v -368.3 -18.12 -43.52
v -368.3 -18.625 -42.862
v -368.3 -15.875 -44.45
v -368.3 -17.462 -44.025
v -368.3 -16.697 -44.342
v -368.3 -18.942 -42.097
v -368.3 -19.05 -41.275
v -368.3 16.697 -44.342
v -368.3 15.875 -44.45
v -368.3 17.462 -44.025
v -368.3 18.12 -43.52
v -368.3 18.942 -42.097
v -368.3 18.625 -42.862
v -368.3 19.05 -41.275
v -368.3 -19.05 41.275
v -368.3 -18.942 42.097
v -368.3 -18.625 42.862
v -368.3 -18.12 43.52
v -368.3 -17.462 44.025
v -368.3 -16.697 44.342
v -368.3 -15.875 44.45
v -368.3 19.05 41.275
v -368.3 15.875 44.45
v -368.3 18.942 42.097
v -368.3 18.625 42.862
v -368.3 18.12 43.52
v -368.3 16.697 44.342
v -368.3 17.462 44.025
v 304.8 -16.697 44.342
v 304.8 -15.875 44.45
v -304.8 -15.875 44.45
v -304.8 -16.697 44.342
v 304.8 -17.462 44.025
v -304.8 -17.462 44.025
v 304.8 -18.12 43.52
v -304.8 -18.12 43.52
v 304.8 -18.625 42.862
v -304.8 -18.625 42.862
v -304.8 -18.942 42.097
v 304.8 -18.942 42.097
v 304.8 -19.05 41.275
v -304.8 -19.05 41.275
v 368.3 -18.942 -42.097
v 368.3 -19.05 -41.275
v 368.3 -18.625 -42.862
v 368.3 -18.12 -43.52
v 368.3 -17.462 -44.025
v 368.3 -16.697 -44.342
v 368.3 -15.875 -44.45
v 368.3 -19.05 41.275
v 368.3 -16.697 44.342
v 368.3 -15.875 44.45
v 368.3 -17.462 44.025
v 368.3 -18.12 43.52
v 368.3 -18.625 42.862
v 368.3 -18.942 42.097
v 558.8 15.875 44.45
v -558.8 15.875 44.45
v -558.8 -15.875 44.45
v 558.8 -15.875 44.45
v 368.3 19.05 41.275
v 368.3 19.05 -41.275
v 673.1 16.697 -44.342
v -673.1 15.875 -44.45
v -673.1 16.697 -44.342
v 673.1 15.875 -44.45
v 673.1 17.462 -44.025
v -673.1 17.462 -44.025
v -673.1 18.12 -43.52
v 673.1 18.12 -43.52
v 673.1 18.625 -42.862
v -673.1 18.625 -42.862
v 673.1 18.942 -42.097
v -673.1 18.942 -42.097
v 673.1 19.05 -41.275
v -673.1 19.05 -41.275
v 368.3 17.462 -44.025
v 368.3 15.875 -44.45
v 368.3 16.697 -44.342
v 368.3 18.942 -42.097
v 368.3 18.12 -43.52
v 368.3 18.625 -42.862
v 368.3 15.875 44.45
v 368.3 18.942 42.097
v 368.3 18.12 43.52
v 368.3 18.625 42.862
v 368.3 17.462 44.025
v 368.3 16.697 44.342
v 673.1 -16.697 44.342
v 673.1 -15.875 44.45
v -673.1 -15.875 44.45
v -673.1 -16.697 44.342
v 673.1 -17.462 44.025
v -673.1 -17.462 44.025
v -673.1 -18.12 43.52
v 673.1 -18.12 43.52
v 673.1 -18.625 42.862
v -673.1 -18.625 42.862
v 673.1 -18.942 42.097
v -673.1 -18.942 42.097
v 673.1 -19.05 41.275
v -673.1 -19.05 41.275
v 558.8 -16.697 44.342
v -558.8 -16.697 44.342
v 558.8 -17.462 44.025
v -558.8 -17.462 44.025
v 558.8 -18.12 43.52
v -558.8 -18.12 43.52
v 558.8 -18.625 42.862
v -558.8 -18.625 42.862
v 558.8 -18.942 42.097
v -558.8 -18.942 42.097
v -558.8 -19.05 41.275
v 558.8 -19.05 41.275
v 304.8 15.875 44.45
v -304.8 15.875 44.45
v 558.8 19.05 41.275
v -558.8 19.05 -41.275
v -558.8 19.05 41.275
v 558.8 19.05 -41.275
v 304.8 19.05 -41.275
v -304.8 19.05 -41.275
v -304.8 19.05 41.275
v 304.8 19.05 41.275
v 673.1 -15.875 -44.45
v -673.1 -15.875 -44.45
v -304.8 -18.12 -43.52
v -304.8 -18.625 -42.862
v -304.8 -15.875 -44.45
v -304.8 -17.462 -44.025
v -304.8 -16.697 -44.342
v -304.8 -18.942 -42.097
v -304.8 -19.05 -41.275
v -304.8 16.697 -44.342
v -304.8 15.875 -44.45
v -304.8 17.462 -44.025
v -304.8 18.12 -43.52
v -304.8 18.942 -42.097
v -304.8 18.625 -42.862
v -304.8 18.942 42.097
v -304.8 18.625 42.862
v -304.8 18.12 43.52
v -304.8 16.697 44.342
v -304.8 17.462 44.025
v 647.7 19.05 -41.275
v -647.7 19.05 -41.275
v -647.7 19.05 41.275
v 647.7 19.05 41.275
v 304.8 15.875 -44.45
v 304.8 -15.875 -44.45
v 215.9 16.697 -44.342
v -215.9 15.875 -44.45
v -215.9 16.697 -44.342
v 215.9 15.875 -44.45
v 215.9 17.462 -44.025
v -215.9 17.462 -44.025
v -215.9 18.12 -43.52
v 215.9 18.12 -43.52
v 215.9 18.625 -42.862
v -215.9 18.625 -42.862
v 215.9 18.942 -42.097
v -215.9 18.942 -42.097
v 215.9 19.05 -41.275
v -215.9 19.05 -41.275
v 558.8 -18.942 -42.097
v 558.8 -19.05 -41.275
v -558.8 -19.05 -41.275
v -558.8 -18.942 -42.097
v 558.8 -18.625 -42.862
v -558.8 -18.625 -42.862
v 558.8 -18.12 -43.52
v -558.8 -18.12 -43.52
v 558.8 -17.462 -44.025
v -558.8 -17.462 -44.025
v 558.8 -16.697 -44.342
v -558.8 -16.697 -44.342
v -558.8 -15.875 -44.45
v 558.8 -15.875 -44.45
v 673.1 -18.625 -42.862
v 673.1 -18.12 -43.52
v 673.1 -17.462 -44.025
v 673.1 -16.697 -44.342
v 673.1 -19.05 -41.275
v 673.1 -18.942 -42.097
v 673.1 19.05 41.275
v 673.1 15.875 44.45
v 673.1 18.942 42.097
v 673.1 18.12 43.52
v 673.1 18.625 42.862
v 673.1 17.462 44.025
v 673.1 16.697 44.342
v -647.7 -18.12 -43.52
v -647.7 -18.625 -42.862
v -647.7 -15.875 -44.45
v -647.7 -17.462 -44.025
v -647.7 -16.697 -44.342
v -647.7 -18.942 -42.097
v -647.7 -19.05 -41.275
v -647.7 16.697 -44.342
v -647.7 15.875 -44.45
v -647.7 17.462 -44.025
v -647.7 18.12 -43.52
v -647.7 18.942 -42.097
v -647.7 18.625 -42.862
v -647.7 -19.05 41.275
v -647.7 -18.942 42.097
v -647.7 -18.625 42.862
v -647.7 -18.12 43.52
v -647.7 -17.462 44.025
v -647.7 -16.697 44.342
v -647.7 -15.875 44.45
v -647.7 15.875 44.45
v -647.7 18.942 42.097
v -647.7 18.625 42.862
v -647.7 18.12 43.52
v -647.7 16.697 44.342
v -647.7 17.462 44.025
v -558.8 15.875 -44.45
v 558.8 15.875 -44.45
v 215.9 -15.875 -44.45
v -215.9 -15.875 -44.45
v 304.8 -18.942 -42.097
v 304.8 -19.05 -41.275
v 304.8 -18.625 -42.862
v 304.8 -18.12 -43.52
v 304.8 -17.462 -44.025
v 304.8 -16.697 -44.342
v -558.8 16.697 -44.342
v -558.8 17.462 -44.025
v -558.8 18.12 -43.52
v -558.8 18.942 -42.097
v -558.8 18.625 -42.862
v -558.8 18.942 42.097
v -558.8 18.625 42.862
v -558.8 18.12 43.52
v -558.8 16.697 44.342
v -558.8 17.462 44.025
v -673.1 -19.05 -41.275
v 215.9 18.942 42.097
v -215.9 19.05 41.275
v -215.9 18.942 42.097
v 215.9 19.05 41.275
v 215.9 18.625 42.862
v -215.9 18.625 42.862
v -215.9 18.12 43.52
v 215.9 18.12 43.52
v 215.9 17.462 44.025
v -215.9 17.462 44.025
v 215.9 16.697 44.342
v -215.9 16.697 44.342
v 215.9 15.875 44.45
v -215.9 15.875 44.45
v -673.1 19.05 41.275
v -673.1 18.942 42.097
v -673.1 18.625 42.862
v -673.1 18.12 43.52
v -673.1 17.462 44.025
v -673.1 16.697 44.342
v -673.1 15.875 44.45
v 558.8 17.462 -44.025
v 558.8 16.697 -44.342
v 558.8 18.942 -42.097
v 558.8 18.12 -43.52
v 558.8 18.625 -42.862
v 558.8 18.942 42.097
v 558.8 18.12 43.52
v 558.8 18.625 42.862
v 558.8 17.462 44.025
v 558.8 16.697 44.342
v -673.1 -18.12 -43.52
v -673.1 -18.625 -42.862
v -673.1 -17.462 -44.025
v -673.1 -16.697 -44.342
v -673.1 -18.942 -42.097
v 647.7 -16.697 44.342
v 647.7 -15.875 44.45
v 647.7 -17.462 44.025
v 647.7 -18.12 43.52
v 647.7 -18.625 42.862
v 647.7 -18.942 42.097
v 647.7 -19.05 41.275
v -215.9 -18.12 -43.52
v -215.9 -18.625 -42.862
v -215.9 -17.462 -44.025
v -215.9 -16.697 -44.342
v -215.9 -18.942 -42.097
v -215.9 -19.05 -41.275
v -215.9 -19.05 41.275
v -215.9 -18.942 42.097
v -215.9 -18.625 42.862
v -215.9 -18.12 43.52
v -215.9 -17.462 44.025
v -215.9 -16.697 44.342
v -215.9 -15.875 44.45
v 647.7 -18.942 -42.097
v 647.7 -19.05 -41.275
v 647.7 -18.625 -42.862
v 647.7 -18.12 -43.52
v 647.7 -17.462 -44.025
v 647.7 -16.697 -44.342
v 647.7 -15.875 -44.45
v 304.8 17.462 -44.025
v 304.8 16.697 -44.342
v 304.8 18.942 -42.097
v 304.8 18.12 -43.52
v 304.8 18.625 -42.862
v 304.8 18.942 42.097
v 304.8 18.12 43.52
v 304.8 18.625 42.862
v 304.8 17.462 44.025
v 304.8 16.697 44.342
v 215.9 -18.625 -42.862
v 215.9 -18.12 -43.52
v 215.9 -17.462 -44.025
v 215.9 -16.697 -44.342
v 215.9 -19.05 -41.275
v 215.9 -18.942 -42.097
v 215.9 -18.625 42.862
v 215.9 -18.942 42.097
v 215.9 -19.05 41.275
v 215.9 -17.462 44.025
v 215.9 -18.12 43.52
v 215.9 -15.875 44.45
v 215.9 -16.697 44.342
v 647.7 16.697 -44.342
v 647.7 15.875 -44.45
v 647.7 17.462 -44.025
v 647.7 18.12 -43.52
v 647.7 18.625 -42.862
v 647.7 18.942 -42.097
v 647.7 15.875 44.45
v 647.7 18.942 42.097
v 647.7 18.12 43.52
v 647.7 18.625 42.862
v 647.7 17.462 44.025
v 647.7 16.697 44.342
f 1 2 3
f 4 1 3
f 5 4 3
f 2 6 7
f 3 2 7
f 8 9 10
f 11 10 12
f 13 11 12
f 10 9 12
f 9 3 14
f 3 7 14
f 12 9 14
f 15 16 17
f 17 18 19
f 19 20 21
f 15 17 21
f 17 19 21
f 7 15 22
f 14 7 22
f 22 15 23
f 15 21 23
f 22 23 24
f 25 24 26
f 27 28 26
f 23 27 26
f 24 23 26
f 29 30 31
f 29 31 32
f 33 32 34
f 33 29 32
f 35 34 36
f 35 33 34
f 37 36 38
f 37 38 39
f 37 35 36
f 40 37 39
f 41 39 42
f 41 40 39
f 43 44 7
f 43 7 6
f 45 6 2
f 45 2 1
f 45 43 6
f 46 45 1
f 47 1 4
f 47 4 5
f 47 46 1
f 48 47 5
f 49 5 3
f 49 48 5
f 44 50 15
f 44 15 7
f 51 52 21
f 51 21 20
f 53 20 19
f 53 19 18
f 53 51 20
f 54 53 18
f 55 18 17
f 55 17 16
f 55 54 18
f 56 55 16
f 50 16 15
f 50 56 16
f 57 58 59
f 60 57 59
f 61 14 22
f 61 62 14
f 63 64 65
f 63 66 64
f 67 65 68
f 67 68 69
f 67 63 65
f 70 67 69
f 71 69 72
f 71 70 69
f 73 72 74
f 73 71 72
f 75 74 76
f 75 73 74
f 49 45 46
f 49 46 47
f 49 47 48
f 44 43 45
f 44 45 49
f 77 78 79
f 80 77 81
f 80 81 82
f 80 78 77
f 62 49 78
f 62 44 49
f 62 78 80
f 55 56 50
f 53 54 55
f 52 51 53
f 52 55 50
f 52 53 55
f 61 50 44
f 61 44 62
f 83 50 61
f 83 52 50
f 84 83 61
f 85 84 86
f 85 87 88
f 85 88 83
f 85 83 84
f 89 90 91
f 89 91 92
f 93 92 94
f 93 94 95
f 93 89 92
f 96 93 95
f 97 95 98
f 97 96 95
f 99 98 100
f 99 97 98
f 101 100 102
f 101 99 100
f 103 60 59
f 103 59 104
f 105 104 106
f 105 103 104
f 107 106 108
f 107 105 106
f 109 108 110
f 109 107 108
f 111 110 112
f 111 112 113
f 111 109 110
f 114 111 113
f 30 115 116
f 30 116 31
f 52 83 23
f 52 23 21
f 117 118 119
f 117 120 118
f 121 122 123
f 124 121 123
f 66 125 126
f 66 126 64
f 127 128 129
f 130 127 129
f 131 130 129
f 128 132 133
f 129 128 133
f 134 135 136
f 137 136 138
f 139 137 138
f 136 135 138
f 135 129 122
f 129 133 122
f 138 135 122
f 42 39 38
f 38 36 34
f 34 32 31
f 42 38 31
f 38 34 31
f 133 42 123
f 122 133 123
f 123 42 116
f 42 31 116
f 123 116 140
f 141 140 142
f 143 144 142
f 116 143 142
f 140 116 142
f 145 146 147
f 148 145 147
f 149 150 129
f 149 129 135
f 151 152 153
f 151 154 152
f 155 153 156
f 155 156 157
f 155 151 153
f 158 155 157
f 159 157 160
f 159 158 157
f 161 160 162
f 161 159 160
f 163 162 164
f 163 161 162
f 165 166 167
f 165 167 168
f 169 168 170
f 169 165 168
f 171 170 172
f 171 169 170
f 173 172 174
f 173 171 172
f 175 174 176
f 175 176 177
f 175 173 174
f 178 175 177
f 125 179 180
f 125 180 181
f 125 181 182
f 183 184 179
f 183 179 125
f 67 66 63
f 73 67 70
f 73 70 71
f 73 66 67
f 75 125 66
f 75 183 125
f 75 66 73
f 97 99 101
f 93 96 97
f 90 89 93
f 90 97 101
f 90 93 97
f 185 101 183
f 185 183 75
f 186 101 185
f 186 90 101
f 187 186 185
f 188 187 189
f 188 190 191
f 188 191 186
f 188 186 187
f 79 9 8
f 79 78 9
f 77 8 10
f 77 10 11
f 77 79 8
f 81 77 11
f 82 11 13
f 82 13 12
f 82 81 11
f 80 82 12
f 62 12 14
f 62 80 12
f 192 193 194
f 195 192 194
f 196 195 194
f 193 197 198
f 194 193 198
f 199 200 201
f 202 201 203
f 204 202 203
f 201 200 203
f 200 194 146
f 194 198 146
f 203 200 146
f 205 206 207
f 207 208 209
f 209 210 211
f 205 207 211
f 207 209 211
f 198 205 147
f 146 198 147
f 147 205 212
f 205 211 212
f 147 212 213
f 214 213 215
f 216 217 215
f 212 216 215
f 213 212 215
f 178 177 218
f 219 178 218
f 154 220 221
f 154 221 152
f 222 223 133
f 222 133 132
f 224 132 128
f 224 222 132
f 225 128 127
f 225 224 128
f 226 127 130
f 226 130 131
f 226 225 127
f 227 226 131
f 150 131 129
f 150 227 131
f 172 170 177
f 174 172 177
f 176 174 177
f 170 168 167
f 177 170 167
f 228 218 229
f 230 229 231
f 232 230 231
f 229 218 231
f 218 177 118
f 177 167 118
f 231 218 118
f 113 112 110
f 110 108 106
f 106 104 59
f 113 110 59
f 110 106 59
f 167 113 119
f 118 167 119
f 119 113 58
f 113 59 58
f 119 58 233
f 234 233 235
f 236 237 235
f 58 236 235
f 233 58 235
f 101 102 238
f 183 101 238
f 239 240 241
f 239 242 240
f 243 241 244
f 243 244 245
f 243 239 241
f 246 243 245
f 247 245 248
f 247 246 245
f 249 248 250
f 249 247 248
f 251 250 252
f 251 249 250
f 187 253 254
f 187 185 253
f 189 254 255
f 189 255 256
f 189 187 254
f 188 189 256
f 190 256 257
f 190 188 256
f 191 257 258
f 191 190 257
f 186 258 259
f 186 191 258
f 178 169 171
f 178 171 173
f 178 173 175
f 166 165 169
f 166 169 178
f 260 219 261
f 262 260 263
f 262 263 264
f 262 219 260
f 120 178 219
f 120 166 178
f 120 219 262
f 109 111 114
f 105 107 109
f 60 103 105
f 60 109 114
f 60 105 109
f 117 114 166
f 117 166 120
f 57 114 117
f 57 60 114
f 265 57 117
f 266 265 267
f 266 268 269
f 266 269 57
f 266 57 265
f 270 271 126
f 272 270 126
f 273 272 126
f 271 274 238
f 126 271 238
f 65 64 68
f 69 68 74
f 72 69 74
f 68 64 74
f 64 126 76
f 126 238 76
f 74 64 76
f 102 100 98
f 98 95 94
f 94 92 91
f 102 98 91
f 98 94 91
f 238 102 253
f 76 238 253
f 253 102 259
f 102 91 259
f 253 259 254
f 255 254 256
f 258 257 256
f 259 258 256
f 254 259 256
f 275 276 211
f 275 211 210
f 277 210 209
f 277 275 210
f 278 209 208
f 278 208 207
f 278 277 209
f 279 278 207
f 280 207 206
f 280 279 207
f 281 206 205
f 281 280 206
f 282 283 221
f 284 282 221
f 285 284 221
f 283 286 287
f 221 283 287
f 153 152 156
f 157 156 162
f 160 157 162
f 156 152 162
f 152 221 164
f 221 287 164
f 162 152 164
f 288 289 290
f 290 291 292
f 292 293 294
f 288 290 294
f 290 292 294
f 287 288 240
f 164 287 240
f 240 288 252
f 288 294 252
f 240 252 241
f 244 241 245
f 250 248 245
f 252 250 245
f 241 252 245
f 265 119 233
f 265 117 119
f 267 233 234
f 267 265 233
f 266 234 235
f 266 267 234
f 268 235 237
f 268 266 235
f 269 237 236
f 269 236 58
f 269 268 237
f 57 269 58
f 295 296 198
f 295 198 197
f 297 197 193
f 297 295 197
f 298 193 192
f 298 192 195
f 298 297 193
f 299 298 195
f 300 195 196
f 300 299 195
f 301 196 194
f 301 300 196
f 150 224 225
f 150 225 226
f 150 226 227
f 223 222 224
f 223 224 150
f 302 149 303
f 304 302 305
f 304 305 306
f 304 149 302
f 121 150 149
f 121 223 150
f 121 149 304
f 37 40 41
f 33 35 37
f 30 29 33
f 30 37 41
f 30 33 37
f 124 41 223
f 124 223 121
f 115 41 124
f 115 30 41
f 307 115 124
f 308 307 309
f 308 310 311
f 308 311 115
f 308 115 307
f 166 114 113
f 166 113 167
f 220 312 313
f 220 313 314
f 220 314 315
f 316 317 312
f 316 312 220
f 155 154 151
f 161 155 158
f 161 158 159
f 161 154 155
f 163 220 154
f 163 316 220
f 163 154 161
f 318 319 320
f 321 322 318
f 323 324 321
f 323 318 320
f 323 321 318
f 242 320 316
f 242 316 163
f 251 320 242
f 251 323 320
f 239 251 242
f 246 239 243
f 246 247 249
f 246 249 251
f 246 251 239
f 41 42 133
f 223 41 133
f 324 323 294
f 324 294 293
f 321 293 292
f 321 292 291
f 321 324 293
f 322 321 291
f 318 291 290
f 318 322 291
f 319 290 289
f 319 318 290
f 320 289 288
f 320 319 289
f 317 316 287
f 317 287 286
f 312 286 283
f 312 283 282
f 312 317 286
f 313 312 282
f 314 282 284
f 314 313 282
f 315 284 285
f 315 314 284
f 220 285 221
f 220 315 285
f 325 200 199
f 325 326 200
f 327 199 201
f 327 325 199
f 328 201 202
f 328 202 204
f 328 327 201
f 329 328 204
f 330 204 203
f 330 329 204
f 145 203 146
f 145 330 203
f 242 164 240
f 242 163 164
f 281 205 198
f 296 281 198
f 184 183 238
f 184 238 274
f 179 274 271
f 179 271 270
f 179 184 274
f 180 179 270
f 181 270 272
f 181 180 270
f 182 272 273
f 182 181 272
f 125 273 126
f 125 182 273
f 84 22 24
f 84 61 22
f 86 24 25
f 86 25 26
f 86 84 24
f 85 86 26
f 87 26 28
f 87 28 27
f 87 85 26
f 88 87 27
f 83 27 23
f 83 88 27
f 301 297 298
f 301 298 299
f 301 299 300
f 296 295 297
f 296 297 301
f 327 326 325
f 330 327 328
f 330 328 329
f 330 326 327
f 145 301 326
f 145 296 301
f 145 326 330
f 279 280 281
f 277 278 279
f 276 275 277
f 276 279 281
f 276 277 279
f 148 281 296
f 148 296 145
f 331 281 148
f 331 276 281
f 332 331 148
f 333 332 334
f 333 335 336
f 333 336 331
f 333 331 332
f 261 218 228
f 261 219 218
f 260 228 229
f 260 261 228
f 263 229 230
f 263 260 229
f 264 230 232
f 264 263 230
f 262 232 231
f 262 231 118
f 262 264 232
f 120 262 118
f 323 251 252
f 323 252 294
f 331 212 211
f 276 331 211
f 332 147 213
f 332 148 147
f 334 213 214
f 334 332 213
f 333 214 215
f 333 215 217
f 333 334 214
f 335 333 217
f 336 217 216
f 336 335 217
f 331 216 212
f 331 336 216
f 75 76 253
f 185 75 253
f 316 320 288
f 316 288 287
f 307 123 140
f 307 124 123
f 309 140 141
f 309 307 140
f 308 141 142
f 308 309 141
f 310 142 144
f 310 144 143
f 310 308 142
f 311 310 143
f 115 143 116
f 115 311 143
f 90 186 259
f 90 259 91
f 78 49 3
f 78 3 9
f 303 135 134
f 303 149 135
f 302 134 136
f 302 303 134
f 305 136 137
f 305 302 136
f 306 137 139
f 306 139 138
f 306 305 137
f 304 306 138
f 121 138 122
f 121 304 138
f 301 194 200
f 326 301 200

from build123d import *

# Parameters (mm, degrees)
F1_DEPTH = 368.3
F2_DEPTH = 215.9
F3_DEPTH = 304.8
F4_DEPTH = 558.8
F5_DEPTH = 647.7
F6_DEPTH = 673.1


with BuildPart() as f1:
    # F0 (on Right) → F1 (new body, symmetric)
    with BuildSketch(Plane.YZ):
        with BuildLine():
            ThreePointArc((19.05, 41.275), (18.120064, 43.520064), (15.875, 44.45))
            Line((15.875, 44.45), (-15.875, 44.45))
            ThreePointArc((-15.875, 44.45), (-18.120064, 43.520064), (-19.05, 41.275))
            Line((-19.05, 41.275), (-19.05, -41.275))
            ThreePointArc((-19.05, -41.275), (-18.120064, -43.520064), (-15.875, -44.45))
            Line((-15.875, -44.45), (15.875, -44.45))
            ThreePointArc((15.875, -44.45), (18.120064, -43.520064), (19.05, -41.275))
            Line((19.05, -41.275), (19.05, 41.275))
        make_face()
    extrude(amount=F1_DEPTH, both=True)


with BuildPart() as f2:
    # F0 (on Right) → F2 (new body, symmetric)
    with BuildSketch(Plane.YZ):
        with BuildLine():
            ThreePointArc((19.05, 41.275), (18.120064, 43.520064), (15.875, 44.45))
            Line((15.875, 44.45), (-15.875, 44.45))
            ThreePointArc((-15.875, 44.45), (-18.120064, 43.520064), (-19.05, 41.275))
            Line((-19.05, 41.275), (-19.05, -41.275))
            ThreePointArc((-19.05, -41.275), (-18.120064, -43.520064), (-15.875, -44.45))
            Line((-15.875, -44.45), (15.875, -44.45))
            ThreePointArc((15.875, -44.45), (18.120064, -43.520064), (19.05, -41.275))
            Line((19.05, -41.275), (19.05, 41.275))
        make_face()
    extrude(amount=F2_DEPTH, both=True)


with BuildPart() as f3:
    # F0 (on Right) → F3 (new body, symmetric)
    with BuildSketch(Plane.YZ):
        with BuildLine():
            ThreePointArc((19.05, 41.275), (18.120064, 43.520064), (15.875, 44.45))
            Line((15.875, 44.45), (-15.875, 44.45))
            ThreePointArc((-15.875, 44.45), (-18.120064, 43.520064), (-19.05, 41.275))
            Line((-19.05, 41.275), (-19.05, -41.275))
            ThreePointArc((-19.05, -41.275), (-18.120064, -43.520064), (-15.875, -44.45))
            Line((-15.875, -44.45), (15.875, -44.45))
            ThreePointArc((15.875, -44.45), (18.120064, -43.520064), (19.05, -41.275))
            Line((19.05, -41.275), (19.05, 41.275))
        make_face()
    extrude(amount=F3_DEPTH, both=True)


with BuildPart() as f4:
    # F0 (on Right) → F4 (new body, symmetric)
    with BuildSketch(Plane.YZ):
        with BuildLine():
            ThreePointArc((19.05, 41.275), (18.120064, 43.520064), (15.875, 44.45))
            Line((15.875, 44.45), (-15.875, 44.45))
            ThreePointArc((-15.875, 44.45), (-18.120064, 43.520064), (-19.05, 41.275))
            Line((-19.05, 41.275), (-19.05, -41.275))
            ThreePointArc((-19.05, -41.275), (-18.120064, -43.520064), (-15.875, -44.45))
            Line((-15.875, -44.45), (15.875, -44.45))
            ThreePointArc((15.875, -44.45), (18.120064, -43.520064), (19.05, -41.275))
            Line((19.05, -41.275), (19.05, 41.275))
        make_face()
    extrude(amount=F4_DEPTH, both=True)


with BuildPart() as f5:
    # F0 (on Right) → F5 (new body, symmetric)
    with BuildSketch(Plane.YZ):
        with BuildLine():
            ThreePointArc((19.05, 41.275), (18.120064, 43.520064), (15.875, 44.45))
            Line((15.875, 44.45), (-15.875, 44.45))
            ThreePointArc((-15.875, 44.45), (-18.120064, 43.520064), (-19.05, 41.275))
            Line((-19.05, 41.275), (-19.05, -41.275))
            ThreePointArc((-19.05, -41.275), (-18.120064, -43.520064), (-15.875, -44.45))
            Line((-15.875, -44.45), (15.875, -44.45))
            ThreePointArc((15.875, -44.45), (18.120064, -43.520064), (19.05, -41.275))
            Line((19.05, -41.275), (19.05, 41.275))
        make_face()
    extrude(amount=F5_DEPTH, both=True)


with BuildPart() as f6:
    # F0 (on Right) → F6 (new body, symmetric)
    with BuildSketch(Plane.YZ):
        with BuildLine():
            ThreePointArc((19.05, 41.275), (18.120064, 43.520064), (15.875, 44.45))
            Line((15.875, 44.45), (-15.875, 44.45))
            ThreePointArc((-15.875, 44.45), (-18.120064, 43.520064), (-19.05, 41.275))
            Line((-19.05, 41.275), (-19.05, -41.275))
            ThreePointArc((-19.05, -41.275), (-18.120064, -43.520064), (-15.875, -44.45))
            Line((-15.875, -44.45), (15.875, -44.45))
            ThreePointArc((15.875, -44.45), (18.120064, -43.520064), (19.05, -41.275))
            Line((19.05, -41.275), (19.05, 41.275))
        make_face()
    extrude(amount=F6_DEPTH, both=True)


solid = Compound([f1.part, f2.part, f3.part, f4.part, f5.part, f6.part])
